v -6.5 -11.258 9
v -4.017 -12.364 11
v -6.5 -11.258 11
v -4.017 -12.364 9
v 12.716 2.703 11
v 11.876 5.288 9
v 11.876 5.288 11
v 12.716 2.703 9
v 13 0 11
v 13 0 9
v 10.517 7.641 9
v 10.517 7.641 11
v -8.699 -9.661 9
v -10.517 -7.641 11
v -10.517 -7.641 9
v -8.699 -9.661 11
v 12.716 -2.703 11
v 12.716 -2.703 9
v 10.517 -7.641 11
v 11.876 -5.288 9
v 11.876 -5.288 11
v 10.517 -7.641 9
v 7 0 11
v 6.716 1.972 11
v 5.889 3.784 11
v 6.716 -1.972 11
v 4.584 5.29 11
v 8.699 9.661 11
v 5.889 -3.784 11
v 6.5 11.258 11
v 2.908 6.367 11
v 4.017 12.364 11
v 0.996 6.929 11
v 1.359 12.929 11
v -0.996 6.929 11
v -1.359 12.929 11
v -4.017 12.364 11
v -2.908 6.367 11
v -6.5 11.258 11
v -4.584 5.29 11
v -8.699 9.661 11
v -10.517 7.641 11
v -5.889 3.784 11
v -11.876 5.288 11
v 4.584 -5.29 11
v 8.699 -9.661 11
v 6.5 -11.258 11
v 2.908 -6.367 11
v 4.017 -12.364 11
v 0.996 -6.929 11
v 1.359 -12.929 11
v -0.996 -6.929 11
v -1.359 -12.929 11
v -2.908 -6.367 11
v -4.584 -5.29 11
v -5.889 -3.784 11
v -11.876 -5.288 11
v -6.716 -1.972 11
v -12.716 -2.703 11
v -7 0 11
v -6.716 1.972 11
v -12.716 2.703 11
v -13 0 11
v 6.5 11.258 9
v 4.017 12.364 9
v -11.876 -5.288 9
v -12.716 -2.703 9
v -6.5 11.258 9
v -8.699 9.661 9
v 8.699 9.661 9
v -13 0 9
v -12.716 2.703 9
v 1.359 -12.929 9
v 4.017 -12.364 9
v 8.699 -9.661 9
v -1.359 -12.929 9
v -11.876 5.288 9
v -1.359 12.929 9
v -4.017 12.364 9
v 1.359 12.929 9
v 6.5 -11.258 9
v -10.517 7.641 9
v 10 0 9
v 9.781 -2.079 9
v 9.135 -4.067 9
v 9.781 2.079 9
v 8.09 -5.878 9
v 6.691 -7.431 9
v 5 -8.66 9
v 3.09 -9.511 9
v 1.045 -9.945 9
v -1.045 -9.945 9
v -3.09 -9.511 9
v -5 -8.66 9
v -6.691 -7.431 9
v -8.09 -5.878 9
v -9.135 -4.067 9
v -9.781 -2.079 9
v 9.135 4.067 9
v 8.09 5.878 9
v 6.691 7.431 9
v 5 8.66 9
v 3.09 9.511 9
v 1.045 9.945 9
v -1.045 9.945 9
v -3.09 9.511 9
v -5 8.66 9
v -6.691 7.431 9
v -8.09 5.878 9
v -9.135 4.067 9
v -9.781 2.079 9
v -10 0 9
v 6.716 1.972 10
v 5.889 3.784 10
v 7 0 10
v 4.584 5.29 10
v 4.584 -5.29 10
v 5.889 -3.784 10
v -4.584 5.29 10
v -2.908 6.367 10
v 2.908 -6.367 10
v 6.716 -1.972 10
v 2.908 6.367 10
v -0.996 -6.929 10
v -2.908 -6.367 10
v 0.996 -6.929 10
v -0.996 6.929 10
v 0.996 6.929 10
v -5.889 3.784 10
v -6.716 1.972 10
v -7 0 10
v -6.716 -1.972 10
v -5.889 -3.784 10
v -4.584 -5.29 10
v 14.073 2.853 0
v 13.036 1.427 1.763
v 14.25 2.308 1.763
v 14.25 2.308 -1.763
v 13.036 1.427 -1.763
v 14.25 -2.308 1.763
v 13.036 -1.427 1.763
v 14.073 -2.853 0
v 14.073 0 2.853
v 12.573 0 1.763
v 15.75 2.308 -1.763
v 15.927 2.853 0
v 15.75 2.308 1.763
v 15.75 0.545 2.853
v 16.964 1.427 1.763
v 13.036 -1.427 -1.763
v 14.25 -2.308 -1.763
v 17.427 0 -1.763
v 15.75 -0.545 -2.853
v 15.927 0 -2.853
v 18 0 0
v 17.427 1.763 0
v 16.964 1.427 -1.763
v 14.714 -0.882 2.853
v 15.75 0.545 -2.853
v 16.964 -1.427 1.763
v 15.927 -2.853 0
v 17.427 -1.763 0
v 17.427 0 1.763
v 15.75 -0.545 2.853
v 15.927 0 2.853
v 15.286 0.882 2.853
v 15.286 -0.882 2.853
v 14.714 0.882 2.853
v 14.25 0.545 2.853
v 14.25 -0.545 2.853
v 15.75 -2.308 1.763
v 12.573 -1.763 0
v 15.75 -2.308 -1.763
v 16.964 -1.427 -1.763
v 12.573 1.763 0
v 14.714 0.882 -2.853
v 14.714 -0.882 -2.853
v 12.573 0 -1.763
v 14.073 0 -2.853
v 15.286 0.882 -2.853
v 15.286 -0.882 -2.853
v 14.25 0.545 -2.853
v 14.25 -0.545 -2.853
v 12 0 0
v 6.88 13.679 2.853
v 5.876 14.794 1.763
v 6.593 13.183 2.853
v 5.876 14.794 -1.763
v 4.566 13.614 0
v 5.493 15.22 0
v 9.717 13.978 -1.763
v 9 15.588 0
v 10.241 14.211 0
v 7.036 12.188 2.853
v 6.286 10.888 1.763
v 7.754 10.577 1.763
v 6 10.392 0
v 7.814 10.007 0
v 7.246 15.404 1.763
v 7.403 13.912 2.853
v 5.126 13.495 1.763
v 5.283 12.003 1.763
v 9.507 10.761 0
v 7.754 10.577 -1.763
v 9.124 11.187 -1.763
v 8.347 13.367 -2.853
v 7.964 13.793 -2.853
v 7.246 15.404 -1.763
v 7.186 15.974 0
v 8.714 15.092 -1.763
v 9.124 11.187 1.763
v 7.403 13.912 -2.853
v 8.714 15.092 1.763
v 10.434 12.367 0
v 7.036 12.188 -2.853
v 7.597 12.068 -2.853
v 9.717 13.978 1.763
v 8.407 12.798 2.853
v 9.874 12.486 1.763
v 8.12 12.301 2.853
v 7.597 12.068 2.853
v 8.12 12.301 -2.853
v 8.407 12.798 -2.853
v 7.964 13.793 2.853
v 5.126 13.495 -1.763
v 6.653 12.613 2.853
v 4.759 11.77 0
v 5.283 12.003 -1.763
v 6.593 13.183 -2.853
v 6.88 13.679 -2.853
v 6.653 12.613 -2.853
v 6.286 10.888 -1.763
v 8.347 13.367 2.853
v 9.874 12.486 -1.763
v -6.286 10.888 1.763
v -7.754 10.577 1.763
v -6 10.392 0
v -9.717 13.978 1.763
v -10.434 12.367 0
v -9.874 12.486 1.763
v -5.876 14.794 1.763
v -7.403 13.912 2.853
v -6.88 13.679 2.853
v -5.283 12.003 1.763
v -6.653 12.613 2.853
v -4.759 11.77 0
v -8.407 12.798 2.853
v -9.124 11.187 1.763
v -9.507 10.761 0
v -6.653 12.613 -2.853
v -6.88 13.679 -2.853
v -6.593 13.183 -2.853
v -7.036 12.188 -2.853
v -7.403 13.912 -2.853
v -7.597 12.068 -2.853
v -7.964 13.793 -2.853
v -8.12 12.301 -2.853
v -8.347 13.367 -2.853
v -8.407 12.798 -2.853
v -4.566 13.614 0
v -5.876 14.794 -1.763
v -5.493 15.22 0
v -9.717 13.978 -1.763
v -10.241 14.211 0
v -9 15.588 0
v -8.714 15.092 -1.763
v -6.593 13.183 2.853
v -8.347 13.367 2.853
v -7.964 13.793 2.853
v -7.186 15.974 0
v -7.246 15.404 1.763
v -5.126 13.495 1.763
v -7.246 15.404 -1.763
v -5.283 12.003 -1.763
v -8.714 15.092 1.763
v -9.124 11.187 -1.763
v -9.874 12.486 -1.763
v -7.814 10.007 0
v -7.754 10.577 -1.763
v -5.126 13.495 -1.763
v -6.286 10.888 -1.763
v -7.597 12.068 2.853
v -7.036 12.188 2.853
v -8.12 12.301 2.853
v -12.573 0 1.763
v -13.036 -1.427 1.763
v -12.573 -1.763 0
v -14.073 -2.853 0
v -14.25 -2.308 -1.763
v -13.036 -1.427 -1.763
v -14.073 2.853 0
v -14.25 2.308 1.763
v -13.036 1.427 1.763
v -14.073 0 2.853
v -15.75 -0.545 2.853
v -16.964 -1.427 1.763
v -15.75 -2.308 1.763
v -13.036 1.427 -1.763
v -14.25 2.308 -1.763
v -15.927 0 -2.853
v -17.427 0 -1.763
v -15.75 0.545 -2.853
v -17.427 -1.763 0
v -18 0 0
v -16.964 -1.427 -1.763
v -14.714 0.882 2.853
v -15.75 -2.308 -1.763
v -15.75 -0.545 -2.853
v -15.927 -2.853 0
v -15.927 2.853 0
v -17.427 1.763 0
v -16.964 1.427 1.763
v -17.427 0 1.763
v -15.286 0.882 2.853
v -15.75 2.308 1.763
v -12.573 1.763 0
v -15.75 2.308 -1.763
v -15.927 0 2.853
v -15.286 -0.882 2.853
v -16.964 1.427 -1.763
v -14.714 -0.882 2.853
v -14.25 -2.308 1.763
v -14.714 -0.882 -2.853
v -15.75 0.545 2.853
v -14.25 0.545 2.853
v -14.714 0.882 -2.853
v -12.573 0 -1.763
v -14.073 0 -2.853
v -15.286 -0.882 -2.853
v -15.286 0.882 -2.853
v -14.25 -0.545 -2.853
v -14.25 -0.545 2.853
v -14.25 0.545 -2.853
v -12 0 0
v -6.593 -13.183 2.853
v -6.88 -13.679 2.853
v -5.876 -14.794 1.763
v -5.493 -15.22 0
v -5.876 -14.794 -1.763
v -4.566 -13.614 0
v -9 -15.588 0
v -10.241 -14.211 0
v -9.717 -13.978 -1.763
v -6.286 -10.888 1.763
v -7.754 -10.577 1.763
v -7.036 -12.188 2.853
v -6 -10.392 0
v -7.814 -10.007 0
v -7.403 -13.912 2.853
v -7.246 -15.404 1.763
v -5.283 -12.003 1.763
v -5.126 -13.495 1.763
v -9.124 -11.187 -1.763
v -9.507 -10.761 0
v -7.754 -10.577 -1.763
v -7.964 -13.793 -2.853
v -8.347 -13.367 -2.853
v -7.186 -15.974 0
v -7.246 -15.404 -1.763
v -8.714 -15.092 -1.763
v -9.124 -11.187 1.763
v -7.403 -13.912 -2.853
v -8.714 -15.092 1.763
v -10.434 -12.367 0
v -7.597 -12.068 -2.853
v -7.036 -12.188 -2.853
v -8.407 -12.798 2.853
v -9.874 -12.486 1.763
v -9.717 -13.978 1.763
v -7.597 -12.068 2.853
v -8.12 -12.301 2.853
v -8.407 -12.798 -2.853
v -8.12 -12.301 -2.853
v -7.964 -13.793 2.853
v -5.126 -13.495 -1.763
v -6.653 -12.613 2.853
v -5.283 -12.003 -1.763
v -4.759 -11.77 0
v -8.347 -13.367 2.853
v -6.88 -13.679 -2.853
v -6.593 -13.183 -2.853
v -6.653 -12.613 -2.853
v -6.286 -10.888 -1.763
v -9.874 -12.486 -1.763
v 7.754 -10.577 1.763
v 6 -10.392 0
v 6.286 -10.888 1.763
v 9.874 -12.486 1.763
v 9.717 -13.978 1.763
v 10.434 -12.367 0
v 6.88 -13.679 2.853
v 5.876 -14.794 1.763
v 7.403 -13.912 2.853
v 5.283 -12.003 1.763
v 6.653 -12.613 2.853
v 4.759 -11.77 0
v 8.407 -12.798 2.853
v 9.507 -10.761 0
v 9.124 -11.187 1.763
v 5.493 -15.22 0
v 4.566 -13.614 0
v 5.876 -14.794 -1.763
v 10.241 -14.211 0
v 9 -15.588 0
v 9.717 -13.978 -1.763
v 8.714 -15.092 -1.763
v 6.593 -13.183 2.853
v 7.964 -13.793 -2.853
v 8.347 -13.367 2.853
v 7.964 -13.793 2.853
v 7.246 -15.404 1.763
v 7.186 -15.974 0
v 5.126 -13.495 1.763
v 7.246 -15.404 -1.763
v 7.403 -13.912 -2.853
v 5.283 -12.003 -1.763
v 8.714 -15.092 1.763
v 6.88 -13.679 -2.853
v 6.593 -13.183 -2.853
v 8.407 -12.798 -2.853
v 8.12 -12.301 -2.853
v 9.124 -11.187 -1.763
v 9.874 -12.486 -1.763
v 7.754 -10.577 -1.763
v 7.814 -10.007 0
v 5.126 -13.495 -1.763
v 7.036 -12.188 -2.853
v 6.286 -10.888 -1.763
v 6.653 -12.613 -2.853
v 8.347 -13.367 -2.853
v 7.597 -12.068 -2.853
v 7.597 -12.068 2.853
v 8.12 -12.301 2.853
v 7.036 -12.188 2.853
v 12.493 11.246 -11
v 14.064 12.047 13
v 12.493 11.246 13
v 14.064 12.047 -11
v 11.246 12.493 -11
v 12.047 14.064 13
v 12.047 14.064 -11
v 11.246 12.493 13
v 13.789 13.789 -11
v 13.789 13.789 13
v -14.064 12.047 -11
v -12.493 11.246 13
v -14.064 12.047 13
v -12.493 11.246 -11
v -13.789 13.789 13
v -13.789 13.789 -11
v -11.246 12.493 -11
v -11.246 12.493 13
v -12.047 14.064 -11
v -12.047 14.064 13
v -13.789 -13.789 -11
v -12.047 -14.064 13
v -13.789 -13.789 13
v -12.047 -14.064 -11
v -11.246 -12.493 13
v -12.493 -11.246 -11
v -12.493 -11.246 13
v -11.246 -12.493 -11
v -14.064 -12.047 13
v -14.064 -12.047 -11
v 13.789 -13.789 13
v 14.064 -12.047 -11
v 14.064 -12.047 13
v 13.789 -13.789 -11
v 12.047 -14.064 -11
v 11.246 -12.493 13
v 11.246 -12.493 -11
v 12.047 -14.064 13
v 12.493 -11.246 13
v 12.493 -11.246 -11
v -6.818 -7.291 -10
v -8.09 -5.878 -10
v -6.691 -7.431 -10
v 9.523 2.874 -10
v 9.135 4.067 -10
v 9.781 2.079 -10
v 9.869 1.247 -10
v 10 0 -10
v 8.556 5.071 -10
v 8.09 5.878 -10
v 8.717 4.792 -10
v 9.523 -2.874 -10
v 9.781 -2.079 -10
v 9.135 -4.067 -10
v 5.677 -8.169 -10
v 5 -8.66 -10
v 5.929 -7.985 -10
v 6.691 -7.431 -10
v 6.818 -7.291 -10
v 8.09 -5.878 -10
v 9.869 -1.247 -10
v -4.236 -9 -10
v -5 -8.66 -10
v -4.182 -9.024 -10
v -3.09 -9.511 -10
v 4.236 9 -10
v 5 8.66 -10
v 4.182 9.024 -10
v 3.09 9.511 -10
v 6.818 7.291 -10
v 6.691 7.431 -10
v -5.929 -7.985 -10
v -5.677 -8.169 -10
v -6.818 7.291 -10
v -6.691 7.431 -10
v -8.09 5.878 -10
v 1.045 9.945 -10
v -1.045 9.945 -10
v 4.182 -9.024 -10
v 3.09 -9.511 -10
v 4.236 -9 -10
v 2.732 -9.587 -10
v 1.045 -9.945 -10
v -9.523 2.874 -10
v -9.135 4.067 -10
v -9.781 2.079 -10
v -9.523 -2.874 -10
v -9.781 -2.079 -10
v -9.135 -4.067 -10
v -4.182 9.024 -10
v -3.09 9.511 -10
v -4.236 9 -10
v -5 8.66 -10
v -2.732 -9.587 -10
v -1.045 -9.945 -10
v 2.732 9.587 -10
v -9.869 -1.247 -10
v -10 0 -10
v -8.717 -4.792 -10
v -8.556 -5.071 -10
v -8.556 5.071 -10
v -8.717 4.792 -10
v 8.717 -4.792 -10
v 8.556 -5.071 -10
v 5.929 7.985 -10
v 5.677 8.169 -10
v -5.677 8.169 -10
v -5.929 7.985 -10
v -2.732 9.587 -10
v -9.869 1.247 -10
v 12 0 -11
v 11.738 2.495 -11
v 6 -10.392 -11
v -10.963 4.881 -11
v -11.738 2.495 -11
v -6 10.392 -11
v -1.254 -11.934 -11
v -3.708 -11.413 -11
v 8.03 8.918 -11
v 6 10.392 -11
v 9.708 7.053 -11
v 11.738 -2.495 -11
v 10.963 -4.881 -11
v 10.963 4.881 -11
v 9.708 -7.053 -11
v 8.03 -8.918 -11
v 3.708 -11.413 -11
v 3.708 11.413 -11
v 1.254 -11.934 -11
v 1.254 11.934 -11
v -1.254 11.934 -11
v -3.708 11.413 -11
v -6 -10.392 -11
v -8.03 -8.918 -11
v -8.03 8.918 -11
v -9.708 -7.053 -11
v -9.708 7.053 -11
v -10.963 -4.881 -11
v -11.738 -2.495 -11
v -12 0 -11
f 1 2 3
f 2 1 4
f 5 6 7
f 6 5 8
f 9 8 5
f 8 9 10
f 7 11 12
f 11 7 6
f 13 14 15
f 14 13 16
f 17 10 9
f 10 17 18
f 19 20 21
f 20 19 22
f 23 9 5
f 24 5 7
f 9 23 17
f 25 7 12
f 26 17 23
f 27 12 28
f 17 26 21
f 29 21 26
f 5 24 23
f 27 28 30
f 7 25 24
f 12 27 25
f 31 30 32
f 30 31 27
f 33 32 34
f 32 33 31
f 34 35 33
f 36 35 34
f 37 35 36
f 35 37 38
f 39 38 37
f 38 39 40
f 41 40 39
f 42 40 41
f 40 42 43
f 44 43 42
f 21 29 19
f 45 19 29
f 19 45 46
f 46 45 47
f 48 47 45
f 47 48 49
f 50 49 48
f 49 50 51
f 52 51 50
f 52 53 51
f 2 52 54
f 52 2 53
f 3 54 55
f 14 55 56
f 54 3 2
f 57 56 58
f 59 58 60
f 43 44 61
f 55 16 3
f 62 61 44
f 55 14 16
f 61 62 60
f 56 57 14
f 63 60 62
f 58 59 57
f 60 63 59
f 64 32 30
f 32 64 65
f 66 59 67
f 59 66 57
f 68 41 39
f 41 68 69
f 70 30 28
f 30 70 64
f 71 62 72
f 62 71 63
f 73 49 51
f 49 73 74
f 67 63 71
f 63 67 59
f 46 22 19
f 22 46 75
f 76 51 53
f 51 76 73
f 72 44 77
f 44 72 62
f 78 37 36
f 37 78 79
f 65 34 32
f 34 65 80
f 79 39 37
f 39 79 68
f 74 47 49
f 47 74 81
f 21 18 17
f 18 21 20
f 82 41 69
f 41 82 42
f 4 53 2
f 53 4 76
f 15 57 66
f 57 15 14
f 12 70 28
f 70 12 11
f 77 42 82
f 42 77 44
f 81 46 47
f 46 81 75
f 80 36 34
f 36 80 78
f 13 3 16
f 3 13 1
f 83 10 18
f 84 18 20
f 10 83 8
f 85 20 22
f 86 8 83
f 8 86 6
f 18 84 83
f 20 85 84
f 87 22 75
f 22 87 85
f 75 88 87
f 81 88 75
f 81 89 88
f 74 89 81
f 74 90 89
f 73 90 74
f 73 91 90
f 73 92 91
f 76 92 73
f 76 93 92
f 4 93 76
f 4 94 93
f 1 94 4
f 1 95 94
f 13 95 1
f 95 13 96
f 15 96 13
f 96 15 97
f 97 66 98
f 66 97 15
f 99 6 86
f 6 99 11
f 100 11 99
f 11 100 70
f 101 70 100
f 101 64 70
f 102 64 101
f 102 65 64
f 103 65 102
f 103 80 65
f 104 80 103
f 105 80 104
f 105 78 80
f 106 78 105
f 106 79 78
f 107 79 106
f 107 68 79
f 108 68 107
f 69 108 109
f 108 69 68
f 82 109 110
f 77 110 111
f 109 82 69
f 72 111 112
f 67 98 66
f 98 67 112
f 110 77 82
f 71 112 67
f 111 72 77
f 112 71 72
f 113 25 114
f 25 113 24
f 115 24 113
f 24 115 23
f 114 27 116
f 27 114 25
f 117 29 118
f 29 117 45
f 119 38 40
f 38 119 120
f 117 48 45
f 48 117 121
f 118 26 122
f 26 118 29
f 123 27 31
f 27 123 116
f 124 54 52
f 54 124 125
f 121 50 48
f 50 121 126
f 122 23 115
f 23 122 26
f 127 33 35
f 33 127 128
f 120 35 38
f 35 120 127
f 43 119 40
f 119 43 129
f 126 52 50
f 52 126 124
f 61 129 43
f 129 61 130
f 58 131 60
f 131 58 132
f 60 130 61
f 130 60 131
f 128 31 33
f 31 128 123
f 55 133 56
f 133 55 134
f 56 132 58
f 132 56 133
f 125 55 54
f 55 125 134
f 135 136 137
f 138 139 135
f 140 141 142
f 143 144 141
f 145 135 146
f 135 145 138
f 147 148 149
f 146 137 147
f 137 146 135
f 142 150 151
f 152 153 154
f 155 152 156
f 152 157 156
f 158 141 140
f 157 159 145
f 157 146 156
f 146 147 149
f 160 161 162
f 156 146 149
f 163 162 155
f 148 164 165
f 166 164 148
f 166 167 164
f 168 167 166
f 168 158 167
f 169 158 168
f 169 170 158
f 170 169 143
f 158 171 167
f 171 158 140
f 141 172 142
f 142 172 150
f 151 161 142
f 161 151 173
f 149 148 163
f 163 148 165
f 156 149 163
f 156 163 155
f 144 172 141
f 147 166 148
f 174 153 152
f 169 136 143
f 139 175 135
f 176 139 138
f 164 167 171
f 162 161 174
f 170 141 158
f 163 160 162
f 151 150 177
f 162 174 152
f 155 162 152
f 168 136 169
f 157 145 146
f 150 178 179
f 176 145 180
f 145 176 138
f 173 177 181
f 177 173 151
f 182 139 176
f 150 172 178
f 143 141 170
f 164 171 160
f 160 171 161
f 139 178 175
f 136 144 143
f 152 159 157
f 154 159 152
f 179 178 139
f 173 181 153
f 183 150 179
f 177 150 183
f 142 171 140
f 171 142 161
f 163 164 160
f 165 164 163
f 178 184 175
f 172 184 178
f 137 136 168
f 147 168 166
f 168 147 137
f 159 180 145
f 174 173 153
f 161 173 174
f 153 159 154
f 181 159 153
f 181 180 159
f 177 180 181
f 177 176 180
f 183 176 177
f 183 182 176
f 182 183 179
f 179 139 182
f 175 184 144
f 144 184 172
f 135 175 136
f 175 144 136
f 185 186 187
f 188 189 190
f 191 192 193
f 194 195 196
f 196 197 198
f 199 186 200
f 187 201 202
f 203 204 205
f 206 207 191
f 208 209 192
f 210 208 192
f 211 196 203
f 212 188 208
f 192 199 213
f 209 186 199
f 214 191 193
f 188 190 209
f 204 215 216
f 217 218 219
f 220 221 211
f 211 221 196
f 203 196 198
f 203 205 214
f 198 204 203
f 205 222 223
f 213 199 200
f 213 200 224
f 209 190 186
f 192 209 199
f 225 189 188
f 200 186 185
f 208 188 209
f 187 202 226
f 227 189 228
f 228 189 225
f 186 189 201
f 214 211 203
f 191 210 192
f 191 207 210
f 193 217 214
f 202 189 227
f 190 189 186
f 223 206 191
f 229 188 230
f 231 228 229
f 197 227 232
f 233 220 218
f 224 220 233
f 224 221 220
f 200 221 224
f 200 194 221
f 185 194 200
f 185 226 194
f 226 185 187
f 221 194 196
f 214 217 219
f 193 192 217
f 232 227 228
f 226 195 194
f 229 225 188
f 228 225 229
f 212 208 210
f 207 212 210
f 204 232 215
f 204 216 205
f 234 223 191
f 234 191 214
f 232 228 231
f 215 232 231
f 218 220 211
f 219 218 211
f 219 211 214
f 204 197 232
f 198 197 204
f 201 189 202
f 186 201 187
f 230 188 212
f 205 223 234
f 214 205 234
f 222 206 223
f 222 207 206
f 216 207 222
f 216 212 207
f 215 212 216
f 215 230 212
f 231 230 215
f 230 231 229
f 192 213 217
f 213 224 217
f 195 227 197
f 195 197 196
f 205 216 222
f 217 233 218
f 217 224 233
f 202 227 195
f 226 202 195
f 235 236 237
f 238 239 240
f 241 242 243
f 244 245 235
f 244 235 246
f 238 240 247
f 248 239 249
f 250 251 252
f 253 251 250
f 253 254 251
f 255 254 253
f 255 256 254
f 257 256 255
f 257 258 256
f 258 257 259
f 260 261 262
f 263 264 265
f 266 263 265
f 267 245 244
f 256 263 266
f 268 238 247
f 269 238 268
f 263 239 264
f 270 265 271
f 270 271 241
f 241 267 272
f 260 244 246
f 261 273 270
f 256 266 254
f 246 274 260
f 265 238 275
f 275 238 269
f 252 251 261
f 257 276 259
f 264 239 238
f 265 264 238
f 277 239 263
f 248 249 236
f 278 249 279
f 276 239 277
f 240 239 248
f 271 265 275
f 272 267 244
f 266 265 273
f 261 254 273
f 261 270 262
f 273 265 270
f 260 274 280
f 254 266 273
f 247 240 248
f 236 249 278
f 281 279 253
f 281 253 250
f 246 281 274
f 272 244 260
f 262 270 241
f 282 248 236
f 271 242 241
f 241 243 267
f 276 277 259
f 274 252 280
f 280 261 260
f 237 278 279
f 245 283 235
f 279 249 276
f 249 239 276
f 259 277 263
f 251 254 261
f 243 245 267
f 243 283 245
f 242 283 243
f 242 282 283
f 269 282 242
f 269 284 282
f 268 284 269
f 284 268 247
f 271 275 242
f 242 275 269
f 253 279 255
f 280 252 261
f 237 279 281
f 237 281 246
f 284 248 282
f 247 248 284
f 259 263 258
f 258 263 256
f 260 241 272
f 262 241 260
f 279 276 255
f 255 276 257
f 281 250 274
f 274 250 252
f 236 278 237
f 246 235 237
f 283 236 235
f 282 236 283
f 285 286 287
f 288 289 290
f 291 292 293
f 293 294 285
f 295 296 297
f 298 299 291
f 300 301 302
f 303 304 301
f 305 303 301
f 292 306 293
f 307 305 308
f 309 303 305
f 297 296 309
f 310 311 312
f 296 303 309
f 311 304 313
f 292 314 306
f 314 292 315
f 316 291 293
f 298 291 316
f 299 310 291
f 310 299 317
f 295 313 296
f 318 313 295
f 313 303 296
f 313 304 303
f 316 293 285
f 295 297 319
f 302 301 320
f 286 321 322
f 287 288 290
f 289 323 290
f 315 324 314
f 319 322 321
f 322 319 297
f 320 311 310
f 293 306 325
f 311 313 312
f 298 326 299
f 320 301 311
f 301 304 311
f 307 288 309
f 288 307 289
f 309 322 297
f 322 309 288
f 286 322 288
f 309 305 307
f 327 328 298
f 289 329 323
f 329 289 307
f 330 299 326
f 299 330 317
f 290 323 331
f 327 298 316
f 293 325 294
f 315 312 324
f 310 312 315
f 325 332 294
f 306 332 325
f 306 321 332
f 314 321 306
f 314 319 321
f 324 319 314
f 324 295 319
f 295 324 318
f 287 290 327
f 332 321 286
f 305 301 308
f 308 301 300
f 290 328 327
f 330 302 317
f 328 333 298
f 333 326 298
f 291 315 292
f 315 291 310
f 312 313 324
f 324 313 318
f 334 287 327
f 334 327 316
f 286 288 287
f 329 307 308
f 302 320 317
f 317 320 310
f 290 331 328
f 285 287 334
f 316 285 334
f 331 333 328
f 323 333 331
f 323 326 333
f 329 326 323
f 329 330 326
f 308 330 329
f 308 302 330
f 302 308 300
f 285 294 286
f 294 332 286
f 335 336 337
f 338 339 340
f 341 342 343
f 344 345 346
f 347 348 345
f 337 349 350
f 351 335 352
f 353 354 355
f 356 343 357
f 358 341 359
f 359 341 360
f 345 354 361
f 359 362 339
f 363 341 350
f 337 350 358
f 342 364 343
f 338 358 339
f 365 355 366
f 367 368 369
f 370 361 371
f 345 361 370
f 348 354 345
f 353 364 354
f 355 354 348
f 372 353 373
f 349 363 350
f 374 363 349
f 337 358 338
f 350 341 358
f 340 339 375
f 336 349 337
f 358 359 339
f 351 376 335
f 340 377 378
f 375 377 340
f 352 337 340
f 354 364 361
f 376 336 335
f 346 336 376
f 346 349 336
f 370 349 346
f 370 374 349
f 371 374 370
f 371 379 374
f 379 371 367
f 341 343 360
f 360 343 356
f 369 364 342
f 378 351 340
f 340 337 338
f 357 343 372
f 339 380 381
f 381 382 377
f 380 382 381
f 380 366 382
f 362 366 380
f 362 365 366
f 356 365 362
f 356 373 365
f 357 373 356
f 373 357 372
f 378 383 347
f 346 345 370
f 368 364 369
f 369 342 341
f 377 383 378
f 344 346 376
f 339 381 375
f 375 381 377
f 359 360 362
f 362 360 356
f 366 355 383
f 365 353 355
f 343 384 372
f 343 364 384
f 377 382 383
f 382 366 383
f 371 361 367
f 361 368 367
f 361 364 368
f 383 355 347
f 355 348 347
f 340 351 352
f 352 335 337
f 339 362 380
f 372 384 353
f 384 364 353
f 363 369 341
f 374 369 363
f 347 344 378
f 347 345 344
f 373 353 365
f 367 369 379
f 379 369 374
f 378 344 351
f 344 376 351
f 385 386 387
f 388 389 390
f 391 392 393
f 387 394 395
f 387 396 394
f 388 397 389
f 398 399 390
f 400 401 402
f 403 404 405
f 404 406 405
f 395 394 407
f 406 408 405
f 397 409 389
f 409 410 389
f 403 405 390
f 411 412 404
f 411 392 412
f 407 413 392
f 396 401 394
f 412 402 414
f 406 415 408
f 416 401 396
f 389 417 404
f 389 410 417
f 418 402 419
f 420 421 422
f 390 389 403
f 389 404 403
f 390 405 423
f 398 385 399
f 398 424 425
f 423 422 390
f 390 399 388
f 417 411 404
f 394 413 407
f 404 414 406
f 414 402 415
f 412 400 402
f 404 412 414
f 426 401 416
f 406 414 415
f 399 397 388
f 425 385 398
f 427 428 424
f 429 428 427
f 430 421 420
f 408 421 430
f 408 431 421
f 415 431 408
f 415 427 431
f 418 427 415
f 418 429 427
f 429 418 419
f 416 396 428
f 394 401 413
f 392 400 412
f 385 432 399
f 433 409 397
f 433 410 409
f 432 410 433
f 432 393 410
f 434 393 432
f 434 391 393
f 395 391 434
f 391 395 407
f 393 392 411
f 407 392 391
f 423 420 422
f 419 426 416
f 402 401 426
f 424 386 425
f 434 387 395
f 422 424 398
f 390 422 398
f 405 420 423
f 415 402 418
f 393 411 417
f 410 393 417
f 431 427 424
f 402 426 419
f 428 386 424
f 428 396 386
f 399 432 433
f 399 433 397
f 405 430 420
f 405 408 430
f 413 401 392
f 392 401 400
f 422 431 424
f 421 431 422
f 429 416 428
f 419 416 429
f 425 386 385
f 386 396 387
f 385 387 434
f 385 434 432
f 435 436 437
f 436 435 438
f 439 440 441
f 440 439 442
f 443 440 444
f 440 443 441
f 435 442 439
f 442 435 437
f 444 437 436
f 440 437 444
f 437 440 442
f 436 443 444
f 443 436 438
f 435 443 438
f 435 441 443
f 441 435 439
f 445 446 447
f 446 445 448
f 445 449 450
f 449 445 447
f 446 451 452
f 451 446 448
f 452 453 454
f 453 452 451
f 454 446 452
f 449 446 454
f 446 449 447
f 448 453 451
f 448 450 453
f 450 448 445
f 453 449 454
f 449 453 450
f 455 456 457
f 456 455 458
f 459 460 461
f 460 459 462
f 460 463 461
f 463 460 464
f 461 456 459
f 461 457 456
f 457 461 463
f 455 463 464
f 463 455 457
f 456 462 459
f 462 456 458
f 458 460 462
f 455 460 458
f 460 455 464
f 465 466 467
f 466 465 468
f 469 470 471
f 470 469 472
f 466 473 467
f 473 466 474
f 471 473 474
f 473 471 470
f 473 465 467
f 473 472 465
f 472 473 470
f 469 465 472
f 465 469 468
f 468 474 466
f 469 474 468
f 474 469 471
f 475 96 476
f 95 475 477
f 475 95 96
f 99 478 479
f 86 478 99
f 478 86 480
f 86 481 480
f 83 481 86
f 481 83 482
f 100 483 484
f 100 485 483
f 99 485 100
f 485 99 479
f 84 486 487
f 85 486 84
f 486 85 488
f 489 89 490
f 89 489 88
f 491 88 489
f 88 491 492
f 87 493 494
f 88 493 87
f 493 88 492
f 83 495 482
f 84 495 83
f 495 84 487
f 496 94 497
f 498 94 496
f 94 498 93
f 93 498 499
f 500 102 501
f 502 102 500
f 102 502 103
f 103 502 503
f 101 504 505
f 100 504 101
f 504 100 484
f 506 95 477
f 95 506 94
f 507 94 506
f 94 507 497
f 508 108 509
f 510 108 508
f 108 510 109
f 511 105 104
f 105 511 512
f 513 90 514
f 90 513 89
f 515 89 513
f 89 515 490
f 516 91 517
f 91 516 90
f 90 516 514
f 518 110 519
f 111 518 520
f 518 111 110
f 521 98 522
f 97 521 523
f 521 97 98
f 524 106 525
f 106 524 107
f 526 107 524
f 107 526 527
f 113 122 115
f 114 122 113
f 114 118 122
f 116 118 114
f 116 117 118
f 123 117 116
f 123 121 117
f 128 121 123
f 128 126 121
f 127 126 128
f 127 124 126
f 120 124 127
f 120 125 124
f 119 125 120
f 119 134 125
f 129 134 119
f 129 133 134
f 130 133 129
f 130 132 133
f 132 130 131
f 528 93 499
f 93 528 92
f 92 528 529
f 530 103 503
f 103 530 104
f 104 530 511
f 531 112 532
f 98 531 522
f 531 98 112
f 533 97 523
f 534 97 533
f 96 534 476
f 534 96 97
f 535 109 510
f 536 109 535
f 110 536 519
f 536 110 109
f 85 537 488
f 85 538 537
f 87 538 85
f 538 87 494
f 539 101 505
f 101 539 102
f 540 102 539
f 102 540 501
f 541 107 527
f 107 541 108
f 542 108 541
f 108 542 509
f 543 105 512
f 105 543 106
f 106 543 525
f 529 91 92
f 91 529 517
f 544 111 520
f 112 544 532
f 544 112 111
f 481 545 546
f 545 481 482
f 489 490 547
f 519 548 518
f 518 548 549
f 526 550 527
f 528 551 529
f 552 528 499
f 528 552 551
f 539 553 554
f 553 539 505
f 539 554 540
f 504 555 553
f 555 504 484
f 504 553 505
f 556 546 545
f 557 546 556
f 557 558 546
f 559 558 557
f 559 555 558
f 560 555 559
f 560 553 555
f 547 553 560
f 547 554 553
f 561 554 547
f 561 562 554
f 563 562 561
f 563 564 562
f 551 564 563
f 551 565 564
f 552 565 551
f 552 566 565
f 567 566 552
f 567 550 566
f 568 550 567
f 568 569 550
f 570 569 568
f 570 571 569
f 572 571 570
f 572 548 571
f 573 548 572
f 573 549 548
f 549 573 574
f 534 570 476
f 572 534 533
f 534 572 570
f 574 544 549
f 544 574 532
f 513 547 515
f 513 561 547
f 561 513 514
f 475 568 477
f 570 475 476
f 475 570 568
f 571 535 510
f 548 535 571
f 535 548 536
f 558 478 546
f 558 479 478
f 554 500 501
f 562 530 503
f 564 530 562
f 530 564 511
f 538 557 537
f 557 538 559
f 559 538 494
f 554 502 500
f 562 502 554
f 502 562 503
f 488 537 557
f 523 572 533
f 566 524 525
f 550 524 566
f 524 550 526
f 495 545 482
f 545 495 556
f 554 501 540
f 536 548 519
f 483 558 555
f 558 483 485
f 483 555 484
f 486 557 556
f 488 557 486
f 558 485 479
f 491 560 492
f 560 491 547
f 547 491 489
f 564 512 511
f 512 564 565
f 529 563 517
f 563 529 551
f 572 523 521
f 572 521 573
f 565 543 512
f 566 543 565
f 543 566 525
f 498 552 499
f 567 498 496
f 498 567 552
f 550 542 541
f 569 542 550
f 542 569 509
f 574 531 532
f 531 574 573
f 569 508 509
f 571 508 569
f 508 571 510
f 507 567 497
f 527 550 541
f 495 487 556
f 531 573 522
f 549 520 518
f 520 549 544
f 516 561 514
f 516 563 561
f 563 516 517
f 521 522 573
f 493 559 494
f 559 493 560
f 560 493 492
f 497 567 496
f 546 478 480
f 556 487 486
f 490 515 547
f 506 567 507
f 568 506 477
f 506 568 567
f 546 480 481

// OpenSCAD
// Generated by CadMonkey
// Prompt: hey cadmonkey, create me a cylinder
// Generated at: 2025-11-12 00:33:12

// Create a simple cylinder
cylinder(h = 20, r = 10, center = true); // Cylinder with height and radius equal to 20mm and centered at origin

// Add base for better visual recognition
translate([0, 0, -11])
    cylinder(h = 2, r1 = 12, r2 = 8, center = false);

// Add top rim for better visual recognition
translate([0, 0, 9])
    difference() {
        cylinder(h = 2, r = 13, center = false);
        cylinder(h = 3, r = 7, center = false);
    }

// Add decorative elements
for (i = [0:5]) {
    rotate([0, 0, i * 60])
    translate([15, 0, 0])
        sphere(r = 3);
}

// Add mounting holes
for (i = [0:3]) {
    rotate([0, 0, i * 90 + 45])
    translate([18, 0, -11])
        cylinder(h = 24, r = 1.5, center = false);
}
